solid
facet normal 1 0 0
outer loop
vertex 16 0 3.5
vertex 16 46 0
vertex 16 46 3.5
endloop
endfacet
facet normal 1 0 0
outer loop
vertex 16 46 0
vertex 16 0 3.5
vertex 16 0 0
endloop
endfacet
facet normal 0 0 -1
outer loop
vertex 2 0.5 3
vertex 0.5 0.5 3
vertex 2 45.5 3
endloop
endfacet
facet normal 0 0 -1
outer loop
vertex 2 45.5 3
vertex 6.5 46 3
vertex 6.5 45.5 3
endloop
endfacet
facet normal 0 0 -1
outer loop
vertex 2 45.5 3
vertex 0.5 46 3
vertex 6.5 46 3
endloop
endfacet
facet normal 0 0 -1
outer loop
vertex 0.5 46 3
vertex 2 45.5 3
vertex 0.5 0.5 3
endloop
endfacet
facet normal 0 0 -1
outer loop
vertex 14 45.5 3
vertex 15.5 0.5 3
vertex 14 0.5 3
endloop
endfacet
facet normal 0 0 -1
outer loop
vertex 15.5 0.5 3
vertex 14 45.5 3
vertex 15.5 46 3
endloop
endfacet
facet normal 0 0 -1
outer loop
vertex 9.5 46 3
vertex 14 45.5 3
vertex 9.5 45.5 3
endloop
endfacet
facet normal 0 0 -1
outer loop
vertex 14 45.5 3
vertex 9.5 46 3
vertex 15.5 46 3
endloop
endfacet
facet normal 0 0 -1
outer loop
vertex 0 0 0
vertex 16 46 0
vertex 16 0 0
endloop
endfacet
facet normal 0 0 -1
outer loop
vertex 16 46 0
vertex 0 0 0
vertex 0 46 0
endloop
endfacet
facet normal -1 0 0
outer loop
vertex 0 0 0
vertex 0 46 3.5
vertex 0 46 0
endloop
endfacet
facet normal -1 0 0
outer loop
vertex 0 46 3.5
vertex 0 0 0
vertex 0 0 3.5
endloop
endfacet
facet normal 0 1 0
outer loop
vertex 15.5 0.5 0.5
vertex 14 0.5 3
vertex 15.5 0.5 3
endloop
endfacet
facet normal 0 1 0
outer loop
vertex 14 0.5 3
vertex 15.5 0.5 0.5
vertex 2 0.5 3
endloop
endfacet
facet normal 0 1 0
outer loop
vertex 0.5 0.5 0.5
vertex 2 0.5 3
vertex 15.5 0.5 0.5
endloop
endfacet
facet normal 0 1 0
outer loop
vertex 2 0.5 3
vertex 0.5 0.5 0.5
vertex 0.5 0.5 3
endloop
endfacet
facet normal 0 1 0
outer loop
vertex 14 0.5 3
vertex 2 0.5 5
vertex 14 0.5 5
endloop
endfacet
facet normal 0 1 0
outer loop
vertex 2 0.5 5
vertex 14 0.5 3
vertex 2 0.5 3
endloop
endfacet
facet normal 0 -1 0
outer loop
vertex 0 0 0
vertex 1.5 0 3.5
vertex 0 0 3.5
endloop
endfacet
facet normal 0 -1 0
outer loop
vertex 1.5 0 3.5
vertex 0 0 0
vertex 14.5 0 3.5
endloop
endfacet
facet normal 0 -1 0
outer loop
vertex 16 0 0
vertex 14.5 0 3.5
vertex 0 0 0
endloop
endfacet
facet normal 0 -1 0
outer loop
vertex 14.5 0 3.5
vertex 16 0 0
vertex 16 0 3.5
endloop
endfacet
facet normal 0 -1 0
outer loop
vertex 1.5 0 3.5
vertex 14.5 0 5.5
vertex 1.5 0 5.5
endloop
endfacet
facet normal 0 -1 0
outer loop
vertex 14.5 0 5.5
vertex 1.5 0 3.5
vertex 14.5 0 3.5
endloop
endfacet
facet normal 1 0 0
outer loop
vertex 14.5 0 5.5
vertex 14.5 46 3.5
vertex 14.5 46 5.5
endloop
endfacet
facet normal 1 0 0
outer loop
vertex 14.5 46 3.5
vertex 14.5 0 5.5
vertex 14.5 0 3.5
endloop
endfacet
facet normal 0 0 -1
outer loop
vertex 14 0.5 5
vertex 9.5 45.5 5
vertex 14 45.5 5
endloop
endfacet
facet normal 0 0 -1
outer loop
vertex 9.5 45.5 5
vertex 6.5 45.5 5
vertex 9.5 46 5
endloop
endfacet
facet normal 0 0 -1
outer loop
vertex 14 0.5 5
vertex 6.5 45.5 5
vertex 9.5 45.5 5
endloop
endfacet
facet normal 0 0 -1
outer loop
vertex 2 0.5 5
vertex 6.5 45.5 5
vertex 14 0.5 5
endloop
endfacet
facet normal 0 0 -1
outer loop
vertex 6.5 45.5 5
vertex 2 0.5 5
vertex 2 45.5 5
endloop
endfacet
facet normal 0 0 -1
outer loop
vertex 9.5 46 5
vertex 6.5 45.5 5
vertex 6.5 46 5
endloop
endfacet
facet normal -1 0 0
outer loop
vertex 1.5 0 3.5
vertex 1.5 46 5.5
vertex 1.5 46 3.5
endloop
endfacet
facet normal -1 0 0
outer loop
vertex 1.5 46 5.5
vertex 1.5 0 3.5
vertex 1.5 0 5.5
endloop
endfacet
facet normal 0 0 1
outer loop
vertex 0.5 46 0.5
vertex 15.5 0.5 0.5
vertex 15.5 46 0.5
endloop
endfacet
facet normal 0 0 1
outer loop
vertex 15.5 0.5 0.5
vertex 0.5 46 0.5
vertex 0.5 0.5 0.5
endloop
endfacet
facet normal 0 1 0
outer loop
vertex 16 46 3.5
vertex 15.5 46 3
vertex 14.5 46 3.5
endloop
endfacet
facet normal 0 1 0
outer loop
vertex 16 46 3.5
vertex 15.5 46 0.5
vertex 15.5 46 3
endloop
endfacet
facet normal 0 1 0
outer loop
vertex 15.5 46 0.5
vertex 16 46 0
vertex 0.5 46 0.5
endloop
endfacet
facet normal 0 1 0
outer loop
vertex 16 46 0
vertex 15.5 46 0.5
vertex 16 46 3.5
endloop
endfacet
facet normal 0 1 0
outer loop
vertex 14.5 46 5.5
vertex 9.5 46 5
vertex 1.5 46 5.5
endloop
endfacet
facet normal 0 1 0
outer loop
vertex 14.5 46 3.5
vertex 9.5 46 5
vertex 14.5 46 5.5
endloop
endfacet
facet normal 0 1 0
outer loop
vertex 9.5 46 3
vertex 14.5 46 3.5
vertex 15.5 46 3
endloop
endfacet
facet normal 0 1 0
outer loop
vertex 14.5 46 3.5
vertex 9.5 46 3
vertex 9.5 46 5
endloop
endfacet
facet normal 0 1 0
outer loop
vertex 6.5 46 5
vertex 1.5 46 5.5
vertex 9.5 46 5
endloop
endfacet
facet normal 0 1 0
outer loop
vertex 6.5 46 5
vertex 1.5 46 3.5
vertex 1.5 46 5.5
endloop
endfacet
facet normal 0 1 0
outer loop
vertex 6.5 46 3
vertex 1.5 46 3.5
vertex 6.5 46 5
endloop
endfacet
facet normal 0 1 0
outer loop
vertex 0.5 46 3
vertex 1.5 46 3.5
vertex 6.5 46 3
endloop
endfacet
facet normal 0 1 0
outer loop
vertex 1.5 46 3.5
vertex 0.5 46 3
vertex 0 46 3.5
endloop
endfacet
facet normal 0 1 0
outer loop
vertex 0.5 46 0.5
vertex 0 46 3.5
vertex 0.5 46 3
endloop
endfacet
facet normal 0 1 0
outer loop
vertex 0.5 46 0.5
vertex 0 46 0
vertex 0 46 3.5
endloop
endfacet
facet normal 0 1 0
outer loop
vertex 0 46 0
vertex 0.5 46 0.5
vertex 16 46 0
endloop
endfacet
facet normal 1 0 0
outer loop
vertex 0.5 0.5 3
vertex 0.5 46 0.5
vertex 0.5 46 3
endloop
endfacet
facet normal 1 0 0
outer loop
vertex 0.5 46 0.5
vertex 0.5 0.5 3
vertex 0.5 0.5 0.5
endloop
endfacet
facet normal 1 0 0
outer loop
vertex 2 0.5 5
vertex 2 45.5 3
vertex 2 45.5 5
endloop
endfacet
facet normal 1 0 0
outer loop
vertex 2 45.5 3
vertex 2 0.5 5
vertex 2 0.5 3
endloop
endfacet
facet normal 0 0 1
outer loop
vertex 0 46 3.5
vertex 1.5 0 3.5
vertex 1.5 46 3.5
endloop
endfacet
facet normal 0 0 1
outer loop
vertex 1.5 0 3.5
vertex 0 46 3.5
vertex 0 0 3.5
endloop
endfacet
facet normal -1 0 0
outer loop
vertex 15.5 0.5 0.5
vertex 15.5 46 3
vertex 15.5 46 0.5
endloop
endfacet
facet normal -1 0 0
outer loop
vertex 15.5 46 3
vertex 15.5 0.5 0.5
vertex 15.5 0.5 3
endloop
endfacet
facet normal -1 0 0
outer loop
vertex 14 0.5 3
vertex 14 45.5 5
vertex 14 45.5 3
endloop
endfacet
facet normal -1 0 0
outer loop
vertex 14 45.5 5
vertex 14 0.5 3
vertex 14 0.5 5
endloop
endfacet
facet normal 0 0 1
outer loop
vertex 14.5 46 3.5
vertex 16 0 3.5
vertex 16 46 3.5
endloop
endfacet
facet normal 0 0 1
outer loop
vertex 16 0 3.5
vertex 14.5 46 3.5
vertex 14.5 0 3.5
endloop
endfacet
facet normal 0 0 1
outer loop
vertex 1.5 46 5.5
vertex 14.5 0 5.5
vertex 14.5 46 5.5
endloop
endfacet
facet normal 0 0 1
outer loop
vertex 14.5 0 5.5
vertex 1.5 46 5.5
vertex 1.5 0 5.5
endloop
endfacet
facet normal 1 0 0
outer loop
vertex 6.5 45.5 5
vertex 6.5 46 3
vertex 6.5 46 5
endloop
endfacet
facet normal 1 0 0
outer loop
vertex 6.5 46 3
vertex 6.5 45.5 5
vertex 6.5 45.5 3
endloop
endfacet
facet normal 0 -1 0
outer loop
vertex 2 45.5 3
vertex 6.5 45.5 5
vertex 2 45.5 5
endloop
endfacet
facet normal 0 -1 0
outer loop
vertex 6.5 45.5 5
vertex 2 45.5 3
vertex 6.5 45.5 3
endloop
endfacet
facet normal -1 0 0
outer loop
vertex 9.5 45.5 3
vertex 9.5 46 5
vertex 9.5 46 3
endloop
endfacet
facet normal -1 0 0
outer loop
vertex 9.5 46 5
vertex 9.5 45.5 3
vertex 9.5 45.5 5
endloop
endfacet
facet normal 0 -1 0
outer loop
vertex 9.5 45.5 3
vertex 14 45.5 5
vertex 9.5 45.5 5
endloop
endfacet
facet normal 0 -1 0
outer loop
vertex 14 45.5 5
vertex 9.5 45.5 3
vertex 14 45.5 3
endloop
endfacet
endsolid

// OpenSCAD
magnet_thickness = 2;
magnet_diameter = 15;
lot_slug_width = 12;
lot_slug_depth = 1;
lot_slug_height = 45;
lot_string_thickness = 2;
case_wall_thickness = 0.5;
top_offset = (magnet_diameter - lot_slug_width) / 2;

// Base
cube([magnet_diameter + case_wall_thickness * 2, case_wall_thickness, magnet_thickness + case_wall_thickness * 2]);
translate([top_offset,0,magnet_thickness + case_wall_thickness * 2])
    cube([lot_slug_width + case_wall_thickness * 2, case_wall_thickness, lot_slug_depth + case_wall_thickness * 2]);
// Bottom wall
cube([magnet_diameter + case_wall_thickness * 2, lot_slug_height + case_wall_thickness * 2, case_wall_thickness]);
// Left wall
cube([case_wall_thickness, lot_slug_height + case_wall_thickness * 2, magnet_thickness + case_wall_thickness * 2]);
translate([top_offset, 0, magnet_thickness + case_wall_thickness * 2])
    cube([case_wall_thickness, lot_slug_height + case_wall_thickness * 2, lot_slug_depth + case_wall_thickness * 2]);
translate([0, 0, magnet_thickness + case_wall_thickness * 2])
    cube([top_offset + case_wall_thickness, lot_slug_height + case_wall_thickness * 2, case_wall_thickness]);
// Right wall 
translate([magnet_diameter + case_wall_thickness, 0, 0])
    cube([case_wall_thickness, lot_slug_height + case_wall_thickness * 2, magnet_thickness + case_wall_thickness * 2]);
translate([magnet_diameter + case_wall_thickness - top_offset, 0, magnet_thickness + case_wall_thickness * 2])
    cube([case_wall_thickness, lot_slug_height + case_wall_thickness * 2, lot_slug_depth + case_wall_thickness * 2]);
translate([magnet_diameter - top_offset + case_wall_thickness, 0, magnet_thickness + case_wall_thickness * 2])
    cube([top_offset + case_wall_thickness, lot_slug_height + case_wall_thickness * 2, case_wall_thickness]);
// Top wall
translate([top_offset,0,magnet_thickness + lot_slug_depth + case_wall_thickness * 4])
    cube([lot_slug_width + case_wall_thickness * 2, lot_slug_height + case_wall_thickness * 2, case_wall_thickness]);
// Top 
translate([top_offset,lot_slug_height + case_wall_thickness,magnet_thickness + case_wall_thickness * 2])
    cube([lot_slug_width / 2 - lot_string_thickness / 2, case_wall_thickness, lot_slug_depth + case_wall_thickness * 2]);
translate([top_offset + lot_slug_width/2  + lot_string_thickness/2 + case_wall_thickness *2 ,lot_slug_height + case_wall_thickness,magnet_thickness + case_wall_thickness * 2])
    cube([lot_slug_width / 2 - lot_string_thickness / 2, case_wall_thickness, lot_slug_depth + case_wall_thickness * 2]);
